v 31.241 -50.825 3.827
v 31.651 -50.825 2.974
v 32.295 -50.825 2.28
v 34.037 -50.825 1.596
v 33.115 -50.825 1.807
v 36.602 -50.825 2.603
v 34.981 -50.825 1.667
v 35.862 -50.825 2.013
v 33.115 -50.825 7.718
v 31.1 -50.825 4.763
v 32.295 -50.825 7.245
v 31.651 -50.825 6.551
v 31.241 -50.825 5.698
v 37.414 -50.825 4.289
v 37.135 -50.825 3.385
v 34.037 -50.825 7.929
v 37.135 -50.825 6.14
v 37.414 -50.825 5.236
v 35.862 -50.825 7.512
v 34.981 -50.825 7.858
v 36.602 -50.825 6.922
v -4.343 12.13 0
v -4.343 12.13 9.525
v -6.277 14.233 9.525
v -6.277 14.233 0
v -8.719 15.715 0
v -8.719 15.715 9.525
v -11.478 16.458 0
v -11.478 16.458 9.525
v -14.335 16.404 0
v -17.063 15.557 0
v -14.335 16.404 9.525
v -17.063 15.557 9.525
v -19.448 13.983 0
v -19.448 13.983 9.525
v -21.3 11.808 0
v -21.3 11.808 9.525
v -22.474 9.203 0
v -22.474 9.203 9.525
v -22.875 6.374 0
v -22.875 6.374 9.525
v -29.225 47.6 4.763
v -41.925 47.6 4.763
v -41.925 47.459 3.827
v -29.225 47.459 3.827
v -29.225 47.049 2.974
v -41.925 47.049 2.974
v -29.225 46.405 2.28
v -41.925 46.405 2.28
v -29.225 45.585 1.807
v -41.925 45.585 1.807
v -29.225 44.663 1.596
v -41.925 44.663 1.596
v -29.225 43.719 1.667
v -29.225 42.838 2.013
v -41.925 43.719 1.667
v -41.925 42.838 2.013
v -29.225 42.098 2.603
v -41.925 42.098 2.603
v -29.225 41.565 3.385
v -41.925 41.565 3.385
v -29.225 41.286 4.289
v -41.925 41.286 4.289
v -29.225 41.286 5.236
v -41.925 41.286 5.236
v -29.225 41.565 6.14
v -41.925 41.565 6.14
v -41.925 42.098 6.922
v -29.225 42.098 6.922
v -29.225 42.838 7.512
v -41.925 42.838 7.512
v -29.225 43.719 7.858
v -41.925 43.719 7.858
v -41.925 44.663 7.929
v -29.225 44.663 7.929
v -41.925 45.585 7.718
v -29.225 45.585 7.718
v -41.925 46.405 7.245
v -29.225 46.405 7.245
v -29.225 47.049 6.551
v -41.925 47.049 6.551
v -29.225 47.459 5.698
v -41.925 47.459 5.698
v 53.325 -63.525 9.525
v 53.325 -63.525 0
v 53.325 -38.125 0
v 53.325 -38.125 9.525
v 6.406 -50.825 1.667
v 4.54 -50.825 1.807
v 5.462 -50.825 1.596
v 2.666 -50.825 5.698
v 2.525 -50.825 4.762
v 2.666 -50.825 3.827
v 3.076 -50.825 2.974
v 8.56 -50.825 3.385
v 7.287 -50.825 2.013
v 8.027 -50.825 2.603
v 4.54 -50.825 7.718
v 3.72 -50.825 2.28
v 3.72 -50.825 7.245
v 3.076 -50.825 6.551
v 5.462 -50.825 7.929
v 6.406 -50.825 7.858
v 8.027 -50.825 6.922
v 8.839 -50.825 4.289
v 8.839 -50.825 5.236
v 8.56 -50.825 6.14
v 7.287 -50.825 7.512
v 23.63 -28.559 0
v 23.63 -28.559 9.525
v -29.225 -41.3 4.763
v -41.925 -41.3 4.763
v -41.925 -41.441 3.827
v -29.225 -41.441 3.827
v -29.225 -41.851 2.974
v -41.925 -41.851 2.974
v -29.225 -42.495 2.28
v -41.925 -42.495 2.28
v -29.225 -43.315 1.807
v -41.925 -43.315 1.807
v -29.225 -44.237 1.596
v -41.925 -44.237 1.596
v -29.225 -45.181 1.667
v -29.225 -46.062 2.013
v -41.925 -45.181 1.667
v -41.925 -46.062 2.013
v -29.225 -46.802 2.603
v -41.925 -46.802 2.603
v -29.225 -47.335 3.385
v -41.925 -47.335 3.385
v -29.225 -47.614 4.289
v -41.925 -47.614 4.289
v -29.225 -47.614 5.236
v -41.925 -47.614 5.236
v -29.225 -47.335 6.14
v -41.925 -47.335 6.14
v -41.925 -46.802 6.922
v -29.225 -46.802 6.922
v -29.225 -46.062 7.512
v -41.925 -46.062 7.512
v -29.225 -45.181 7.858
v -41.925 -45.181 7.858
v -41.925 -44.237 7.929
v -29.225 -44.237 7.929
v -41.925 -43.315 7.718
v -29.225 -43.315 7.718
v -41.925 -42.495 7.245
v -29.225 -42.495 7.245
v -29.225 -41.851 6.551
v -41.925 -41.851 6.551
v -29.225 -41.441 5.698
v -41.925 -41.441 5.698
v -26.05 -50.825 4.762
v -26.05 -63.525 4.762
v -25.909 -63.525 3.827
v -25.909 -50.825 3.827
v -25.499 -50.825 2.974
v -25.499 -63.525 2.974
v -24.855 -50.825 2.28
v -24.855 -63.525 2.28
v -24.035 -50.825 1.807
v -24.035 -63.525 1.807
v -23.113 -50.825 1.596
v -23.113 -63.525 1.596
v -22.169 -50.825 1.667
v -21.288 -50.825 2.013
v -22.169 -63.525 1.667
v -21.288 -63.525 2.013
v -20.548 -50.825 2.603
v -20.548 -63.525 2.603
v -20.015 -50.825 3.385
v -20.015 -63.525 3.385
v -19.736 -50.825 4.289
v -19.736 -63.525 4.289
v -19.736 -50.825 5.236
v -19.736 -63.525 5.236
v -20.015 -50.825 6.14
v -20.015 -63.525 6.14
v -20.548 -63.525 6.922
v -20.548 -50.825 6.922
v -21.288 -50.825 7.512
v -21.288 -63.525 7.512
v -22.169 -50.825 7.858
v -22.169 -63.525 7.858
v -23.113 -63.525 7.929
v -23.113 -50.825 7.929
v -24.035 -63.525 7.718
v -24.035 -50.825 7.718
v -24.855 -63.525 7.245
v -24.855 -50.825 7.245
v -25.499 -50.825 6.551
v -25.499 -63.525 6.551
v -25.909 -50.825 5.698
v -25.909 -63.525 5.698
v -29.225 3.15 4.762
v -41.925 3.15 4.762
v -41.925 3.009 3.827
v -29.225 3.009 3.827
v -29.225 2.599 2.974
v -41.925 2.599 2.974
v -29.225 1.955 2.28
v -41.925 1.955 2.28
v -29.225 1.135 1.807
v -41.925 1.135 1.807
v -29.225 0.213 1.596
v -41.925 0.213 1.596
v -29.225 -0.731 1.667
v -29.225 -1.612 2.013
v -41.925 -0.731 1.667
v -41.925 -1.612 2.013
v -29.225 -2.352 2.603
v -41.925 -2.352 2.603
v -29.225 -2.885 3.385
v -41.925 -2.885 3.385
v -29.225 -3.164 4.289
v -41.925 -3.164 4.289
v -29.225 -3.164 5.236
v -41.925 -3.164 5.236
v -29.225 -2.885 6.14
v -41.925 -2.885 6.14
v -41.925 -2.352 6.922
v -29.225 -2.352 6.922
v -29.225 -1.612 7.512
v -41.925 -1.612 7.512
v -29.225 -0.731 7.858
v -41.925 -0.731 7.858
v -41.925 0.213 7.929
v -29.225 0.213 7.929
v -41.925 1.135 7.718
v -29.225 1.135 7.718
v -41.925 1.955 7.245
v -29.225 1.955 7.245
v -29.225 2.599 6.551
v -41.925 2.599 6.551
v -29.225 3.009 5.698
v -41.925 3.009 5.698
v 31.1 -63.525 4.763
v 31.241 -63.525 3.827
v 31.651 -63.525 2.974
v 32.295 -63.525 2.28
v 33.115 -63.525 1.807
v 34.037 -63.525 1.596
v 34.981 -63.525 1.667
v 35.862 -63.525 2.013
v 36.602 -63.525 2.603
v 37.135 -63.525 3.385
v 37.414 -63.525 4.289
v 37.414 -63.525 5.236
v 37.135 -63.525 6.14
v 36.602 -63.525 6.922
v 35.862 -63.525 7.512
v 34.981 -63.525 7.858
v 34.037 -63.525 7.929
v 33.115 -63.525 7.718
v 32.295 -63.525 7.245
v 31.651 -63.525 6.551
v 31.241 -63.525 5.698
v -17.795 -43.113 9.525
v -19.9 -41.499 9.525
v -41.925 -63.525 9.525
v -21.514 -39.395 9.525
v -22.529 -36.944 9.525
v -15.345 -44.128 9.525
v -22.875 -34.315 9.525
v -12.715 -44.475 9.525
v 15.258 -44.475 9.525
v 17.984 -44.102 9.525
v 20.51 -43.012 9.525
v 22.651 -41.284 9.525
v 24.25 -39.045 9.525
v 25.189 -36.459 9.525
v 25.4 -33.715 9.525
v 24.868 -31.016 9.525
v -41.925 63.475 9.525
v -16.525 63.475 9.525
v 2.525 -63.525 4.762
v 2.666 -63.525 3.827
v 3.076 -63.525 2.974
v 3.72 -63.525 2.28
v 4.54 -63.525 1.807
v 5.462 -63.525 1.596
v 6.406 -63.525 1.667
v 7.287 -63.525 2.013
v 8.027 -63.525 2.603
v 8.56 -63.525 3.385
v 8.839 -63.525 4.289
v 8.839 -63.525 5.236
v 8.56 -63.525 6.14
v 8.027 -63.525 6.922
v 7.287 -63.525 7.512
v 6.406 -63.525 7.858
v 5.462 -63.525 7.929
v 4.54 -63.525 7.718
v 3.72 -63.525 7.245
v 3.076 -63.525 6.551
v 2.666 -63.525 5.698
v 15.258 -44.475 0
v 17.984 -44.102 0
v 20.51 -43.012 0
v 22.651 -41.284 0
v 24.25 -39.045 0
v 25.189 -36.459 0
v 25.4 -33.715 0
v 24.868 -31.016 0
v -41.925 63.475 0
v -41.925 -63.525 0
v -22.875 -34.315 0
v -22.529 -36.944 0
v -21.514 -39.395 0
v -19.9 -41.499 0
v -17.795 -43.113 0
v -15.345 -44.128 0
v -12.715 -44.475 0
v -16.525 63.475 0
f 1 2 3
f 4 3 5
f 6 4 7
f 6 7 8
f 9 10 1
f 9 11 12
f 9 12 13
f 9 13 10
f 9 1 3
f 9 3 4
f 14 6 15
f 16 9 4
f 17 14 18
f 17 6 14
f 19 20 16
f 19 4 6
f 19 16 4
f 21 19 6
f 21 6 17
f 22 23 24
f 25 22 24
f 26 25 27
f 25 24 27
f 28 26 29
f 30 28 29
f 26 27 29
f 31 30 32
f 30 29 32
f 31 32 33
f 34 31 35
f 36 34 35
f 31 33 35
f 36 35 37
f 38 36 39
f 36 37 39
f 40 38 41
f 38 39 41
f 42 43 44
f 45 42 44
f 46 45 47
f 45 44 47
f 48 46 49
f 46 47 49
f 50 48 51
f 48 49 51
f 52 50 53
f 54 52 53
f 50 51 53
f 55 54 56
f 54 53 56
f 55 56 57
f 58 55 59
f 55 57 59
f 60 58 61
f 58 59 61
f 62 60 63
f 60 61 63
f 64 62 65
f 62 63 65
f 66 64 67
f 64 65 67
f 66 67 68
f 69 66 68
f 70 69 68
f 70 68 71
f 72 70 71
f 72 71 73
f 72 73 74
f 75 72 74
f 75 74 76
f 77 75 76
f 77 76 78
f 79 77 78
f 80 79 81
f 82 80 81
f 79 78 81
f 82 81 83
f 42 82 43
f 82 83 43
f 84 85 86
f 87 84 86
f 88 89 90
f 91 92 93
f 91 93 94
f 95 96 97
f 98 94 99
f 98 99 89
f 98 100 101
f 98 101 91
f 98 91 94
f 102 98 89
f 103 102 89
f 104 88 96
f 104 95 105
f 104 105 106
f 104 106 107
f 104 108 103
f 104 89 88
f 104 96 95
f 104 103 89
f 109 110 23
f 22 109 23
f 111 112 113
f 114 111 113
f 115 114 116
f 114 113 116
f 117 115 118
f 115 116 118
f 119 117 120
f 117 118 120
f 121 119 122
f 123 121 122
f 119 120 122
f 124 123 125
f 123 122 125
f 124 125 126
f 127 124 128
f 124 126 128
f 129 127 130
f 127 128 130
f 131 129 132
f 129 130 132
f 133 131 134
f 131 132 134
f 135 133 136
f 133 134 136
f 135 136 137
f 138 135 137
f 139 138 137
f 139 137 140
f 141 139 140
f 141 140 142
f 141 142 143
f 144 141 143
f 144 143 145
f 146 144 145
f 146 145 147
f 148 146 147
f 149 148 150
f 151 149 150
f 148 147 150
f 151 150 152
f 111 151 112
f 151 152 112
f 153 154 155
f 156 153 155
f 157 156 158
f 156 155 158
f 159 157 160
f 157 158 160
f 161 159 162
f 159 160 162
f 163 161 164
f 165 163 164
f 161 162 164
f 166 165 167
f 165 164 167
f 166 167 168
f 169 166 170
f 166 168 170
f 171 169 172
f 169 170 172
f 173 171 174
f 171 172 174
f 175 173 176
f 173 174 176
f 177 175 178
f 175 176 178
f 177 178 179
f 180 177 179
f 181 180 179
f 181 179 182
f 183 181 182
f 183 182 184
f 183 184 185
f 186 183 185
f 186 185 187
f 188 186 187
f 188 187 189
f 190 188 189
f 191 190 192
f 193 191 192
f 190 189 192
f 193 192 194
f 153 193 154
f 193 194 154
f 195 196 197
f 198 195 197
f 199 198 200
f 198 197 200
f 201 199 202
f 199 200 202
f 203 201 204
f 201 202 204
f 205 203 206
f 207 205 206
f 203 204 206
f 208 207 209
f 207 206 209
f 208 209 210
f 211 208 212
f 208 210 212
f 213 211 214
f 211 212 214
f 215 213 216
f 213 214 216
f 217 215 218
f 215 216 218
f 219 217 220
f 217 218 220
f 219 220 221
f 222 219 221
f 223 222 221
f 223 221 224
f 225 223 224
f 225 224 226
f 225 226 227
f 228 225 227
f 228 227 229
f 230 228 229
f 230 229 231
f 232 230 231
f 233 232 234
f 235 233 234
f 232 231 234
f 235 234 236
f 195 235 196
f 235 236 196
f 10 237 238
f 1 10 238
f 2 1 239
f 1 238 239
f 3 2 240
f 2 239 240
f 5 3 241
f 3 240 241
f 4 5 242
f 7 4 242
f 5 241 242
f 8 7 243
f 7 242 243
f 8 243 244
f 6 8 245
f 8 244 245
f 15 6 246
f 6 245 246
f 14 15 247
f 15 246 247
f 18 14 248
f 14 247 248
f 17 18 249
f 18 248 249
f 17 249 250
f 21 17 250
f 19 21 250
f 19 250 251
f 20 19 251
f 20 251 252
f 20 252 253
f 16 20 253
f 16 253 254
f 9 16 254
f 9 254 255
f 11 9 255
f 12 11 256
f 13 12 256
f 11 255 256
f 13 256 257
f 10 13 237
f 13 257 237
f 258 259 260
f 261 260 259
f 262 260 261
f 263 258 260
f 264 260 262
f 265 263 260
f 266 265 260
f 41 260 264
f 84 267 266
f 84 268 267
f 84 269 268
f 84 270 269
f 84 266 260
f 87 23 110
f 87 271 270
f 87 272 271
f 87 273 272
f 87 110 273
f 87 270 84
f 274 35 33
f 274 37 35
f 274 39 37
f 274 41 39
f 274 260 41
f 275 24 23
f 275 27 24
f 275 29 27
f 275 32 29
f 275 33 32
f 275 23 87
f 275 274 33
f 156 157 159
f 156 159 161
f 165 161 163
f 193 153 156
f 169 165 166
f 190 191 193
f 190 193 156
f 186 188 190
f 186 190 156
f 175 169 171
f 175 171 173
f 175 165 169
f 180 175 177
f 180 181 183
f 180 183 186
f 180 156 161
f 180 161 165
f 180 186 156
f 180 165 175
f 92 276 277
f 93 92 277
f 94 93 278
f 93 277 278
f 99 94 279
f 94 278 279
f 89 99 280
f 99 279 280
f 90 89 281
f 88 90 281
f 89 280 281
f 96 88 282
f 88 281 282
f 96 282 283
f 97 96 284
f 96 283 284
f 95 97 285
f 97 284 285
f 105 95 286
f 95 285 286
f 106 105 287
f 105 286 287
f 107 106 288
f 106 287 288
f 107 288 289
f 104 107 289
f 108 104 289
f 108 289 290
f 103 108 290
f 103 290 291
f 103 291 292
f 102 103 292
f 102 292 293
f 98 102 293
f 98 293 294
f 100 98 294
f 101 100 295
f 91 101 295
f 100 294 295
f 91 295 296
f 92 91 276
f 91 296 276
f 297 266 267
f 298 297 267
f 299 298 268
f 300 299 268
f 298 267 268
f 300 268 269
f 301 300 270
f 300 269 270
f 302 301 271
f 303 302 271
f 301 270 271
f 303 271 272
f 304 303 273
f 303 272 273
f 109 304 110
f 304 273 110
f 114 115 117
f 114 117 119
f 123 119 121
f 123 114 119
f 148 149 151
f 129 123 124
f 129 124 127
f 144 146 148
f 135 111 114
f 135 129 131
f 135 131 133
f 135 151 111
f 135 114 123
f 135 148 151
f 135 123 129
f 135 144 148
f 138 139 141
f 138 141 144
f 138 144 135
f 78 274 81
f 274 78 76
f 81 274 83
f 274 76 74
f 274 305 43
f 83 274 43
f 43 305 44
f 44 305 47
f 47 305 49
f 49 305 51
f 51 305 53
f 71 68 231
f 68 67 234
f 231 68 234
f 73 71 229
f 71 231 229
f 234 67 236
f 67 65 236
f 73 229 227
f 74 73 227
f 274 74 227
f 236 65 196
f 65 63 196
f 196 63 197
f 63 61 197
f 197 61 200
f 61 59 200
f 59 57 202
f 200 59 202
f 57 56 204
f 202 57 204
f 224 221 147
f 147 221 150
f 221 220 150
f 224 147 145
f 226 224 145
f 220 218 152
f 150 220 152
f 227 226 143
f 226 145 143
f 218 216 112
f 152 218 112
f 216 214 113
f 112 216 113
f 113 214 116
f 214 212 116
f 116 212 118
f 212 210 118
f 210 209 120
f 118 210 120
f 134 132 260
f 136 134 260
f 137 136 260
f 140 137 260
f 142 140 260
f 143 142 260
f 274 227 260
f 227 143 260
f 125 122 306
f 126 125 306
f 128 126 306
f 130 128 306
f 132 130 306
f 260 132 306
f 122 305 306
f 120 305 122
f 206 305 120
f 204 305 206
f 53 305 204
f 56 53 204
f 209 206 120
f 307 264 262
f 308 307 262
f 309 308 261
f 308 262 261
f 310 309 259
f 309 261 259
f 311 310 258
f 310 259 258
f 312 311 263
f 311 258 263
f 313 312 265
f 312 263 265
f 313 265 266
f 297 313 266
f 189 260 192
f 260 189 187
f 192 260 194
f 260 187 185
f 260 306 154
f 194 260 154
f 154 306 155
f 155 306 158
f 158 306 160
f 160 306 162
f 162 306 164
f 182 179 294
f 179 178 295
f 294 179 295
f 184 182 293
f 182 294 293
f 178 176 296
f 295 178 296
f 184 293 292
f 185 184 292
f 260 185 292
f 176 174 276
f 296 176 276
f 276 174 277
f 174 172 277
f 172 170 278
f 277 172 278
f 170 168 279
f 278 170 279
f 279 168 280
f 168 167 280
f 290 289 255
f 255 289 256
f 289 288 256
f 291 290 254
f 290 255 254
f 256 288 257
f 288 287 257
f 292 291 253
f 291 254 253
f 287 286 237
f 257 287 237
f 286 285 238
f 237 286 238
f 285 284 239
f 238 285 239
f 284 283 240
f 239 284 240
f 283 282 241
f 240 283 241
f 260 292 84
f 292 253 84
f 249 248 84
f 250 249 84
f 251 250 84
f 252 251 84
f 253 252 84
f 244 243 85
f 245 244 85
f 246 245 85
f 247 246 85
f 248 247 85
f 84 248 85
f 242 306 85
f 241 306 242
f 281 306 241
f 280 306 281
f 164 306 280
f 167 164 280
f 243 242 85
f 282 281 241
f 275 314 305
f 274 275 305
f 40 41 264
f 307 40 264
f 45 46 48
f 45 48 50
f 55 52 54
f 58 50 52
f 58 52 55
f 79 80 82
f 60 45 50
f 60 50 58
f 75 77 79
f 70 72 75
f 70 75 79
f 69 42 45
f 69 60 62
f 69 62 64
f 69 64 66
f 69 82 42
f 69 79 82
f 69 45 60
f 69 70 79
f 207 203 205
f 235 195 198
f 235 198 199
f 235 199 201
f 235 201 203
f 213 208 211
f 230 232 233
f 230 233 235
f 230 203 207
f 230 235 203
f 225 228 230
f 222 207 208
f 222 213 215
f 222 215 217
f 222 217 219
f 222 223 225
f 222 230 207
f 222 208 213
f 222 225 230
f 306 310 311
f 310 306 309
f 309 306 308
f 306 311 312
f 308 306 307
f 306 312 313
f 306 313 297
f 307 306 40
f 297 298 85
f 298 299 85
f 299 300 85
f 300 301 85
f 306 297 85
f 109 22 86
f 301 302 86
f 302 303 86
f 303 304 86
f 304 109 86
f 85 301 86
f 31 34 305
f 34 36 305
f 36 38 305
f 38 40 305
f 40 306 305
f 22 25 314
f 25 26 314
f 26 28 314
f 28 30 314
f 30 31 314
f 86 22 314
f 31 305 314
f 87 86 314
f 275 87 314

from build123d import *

# Parameters (mm, degrees)
F1_DEPTH = 9.525
F3_DEPTH = 9.526
F6_DEPTH = 12.7
F7_DEPTH = 12.7
F8_DEPTH = 12.7


with BuildPart() as f1:
    # F0 (on Top) → F1 (new body)
    with BuildSketch(Plane.XY):
        Polygon((-16.5253259897, 63.4753721058), (-41.9253259897, 63.4753721058), (-41.9253259897, -63.5246278942), (53.3246740103, -63.5246278942), (53.3246740103, -38.1246278942), align=None)
    extrude(amount=F1_DEPTH)

    # F2 (on face) → F3 (cut, through all)
    with BuildSketch(Plane.XY.offset(9.525)):
        with BuildLine():
            ThreePointArc((-4.3430600399, 12.1298858759), (-15.7289100643, 16.0767315562), (-22.8753259897, 6.3739530353))
            Line((-22.8753259897, 6.3739530353), (-22.8753259897, -34.3146278942))
            ThreePointArc((-22.8753259897, -34.3146278942), (-19.8995308866, -41.498832791), (-12.7153259897, -44.4746278942))
            Line((-12.7153259897, -44.4746278942), (15.2580733993, -44.4746278942))
            ThreePointArc((15.2580733993, -44.4746278942), (24.2498996226, -39.0446026478), (23.6303393492, -28.5586950536))
            Line((23.6303393492, -28.5586950536), (-4.3430600399, 12.1298858759))
        make_face()
    extrude(amount=-F3_DEPTH, mode=Mode.SUBTRACT)

    # F5 (on face) → F6 (cut)
    with BuildSketch(Plane(origin=(-41.9253259897, 0, 0), x_dir=(0, -1, 0), z_dir=(-1, 0, 0))):
        with BuildLine():
            ThreePointArc((-41.2503721058, 4.7625), (-44.4253721058, 7.9375), (-47.6003721058, 4.7625))
            Line((-47.6003721058, 4.7625), (-41.2503721058, 4.7625))
        make_face()
        with BuildLine():
            ThreePointArc((47.6496278942, 4.7625), (44.4746278942, 7.9375), (41.2996278942, 4.7625))
            Line((41.2996278942, 4.7625), (47.6496278942, 4.7625))
        make_face()
        with BuildLine():
            Line((47.6496278942, 4.7625), (41.2996278942, 4.7625))
            ThreePointArc((41.2996278942, 4.7625), (44.4746278942, 1.5875), (47.6496278942, 4.7625))
        make_face()
        with BuildLine():
            ThreePointArc((3.1996278942, 4.7625), (0.0246278942, 7.9375), (-3.1503721058, 4.7625))
            Line((-3.1503721058, 4.7625), (3.1996278942, 4.7625))
        make_face()
        with BuildLine():
            Line((3.1996278942, 4.7625), (-3.1503721058, 4.7625))
            ThreePointArc((-3.1503721058, 4.7625), (0.0246278942, 1.5875), (3.1996278942, 4.7625))
        make_face()
        with BuildLine():
            Line((-41.2503721058, 4.7625), (-47.6003721058, 4.7625))
            ThreePointArc((-47.6003721058, 4.7625), (-44.4253721058, 1.5875), (-41.2503721058, 4.7625))
        make_face()
    extrude(amount=-F6_DEPTH, mode=Mode.SUBTRACT)

    # F4 (on face) → F7 (cut)
    with BuildSketch(Plane.XZ.offset(63.5246278942)):
        with BuildLine():
            ThreePointArc((-19.7003259897, 4.7625), (-22.8753259897, 7.9375), (-26.0503259897, 4.7625))
            Line((-26.0503259897, 4.7625), (-19.7003259897, 4.7625))
        make_face()
        with BuildLine():
            ThreePointArc((37.4496740103, 4.7625), (34.2746740103, 7.9375), (31.0996740103, 4.7625))
            Line((31.0996740103, 4.7625), (37.4496740103, 4.7625))
        make_face()
        with BuildLine():
            Line((37.4496740103, 4.7625), (31.0996740103, 4.7625))
            ThreePointArc((31.0996740103, 4.7625), (34.2746740103, 1.5875), (37.4496740103, 4.7625))
        make_face()
        with BuildLine():
            ThreePointArc((8.8746740103, 4.7625), (5.6996740103, 7.9375), (2.5246740103, 4.7625))
            Line((2.5246740103, 4.7625), (8.8746740103, 4.7625))
        make_face()
        with BuildLine():
            Line((8.8746740103, 4.7625), (2.5246740103, 4.7625))
            ThreePointArc((2.5246740103, 4.7625), (5.6996740103, 1.5875), (8.8746740103, 4.7625))
        make_face()
        with BuildLine():
            Line((-19.7003259897, 4.7625), (-26.0503259897, 4.7625))
            ThreePointArc((-26.0503259897, 4.7625), (-22.8753259897, 1.5875), (-19.7003259897, 4.7625))
        make_face()
    extrude(amount=-F7_DEPTH, mode=Mode.SUBTRACT)

    # F4 (on face) → F8 (cut)
    with BuildSketch(Plane.XZ.offset(63.5246278942)):
        with BuildLine():
            ThreePointArc((-19.7003259897, 4.7625), (-22.8753259897, 7.9375), (-26.0503259897, 4.7625))
            Line((-26.0503259897, 4.7625), (-19.7003259897, 4.7625))
        make_face()
        with BuildLine():
            ThreePointArc((37.4496740103, 4.7625), (34.2746740103, 7.9375), (31.0996740103, 4.7625))
            Line((31.0996740103, 4.7625), (37.4496740103, 4.7625))
        make_face()
        with BuildLine():
            Line((37.4496740103, 4.7625), (31.0996740103, 4.7625))
            ThreePointArc((31.0996740103, 4.7625), (34.2746740103, 1.5875), (37.4496740103, 4.7625))
        make_face()
        with BuildLine():
            ThreePointArc((8.8746740103, 4.7625), (5.6996740103, 7.9375), (2.5246740103, 4.7625))
            Line((2.5246740103, 4.7625), (8.8746740103, 4.7625))
        make_face()
        with BuildLine():
            Line((8.8746740103, 4.7625), (2.5246740103, 4.7625))
            ThreePointArc((2.5246740103, 4.7625), (5.6996740103, 1.5875), (8.8746740103, 4.7625))
        make_face()
        with BuildLine():
            Line((-19.7003259897, 4.7625), (-26.0503259897, 4.7625))
            ThreePointArc((-26.0503259897, 4.7625), (-22.8753259897, 1.5875), (-19.7003259897, 4.7625))
        make_face()
    extrude(amount=-F8_DEPTH, mode=Mode.SUBTRACT)


solid = f1.part
